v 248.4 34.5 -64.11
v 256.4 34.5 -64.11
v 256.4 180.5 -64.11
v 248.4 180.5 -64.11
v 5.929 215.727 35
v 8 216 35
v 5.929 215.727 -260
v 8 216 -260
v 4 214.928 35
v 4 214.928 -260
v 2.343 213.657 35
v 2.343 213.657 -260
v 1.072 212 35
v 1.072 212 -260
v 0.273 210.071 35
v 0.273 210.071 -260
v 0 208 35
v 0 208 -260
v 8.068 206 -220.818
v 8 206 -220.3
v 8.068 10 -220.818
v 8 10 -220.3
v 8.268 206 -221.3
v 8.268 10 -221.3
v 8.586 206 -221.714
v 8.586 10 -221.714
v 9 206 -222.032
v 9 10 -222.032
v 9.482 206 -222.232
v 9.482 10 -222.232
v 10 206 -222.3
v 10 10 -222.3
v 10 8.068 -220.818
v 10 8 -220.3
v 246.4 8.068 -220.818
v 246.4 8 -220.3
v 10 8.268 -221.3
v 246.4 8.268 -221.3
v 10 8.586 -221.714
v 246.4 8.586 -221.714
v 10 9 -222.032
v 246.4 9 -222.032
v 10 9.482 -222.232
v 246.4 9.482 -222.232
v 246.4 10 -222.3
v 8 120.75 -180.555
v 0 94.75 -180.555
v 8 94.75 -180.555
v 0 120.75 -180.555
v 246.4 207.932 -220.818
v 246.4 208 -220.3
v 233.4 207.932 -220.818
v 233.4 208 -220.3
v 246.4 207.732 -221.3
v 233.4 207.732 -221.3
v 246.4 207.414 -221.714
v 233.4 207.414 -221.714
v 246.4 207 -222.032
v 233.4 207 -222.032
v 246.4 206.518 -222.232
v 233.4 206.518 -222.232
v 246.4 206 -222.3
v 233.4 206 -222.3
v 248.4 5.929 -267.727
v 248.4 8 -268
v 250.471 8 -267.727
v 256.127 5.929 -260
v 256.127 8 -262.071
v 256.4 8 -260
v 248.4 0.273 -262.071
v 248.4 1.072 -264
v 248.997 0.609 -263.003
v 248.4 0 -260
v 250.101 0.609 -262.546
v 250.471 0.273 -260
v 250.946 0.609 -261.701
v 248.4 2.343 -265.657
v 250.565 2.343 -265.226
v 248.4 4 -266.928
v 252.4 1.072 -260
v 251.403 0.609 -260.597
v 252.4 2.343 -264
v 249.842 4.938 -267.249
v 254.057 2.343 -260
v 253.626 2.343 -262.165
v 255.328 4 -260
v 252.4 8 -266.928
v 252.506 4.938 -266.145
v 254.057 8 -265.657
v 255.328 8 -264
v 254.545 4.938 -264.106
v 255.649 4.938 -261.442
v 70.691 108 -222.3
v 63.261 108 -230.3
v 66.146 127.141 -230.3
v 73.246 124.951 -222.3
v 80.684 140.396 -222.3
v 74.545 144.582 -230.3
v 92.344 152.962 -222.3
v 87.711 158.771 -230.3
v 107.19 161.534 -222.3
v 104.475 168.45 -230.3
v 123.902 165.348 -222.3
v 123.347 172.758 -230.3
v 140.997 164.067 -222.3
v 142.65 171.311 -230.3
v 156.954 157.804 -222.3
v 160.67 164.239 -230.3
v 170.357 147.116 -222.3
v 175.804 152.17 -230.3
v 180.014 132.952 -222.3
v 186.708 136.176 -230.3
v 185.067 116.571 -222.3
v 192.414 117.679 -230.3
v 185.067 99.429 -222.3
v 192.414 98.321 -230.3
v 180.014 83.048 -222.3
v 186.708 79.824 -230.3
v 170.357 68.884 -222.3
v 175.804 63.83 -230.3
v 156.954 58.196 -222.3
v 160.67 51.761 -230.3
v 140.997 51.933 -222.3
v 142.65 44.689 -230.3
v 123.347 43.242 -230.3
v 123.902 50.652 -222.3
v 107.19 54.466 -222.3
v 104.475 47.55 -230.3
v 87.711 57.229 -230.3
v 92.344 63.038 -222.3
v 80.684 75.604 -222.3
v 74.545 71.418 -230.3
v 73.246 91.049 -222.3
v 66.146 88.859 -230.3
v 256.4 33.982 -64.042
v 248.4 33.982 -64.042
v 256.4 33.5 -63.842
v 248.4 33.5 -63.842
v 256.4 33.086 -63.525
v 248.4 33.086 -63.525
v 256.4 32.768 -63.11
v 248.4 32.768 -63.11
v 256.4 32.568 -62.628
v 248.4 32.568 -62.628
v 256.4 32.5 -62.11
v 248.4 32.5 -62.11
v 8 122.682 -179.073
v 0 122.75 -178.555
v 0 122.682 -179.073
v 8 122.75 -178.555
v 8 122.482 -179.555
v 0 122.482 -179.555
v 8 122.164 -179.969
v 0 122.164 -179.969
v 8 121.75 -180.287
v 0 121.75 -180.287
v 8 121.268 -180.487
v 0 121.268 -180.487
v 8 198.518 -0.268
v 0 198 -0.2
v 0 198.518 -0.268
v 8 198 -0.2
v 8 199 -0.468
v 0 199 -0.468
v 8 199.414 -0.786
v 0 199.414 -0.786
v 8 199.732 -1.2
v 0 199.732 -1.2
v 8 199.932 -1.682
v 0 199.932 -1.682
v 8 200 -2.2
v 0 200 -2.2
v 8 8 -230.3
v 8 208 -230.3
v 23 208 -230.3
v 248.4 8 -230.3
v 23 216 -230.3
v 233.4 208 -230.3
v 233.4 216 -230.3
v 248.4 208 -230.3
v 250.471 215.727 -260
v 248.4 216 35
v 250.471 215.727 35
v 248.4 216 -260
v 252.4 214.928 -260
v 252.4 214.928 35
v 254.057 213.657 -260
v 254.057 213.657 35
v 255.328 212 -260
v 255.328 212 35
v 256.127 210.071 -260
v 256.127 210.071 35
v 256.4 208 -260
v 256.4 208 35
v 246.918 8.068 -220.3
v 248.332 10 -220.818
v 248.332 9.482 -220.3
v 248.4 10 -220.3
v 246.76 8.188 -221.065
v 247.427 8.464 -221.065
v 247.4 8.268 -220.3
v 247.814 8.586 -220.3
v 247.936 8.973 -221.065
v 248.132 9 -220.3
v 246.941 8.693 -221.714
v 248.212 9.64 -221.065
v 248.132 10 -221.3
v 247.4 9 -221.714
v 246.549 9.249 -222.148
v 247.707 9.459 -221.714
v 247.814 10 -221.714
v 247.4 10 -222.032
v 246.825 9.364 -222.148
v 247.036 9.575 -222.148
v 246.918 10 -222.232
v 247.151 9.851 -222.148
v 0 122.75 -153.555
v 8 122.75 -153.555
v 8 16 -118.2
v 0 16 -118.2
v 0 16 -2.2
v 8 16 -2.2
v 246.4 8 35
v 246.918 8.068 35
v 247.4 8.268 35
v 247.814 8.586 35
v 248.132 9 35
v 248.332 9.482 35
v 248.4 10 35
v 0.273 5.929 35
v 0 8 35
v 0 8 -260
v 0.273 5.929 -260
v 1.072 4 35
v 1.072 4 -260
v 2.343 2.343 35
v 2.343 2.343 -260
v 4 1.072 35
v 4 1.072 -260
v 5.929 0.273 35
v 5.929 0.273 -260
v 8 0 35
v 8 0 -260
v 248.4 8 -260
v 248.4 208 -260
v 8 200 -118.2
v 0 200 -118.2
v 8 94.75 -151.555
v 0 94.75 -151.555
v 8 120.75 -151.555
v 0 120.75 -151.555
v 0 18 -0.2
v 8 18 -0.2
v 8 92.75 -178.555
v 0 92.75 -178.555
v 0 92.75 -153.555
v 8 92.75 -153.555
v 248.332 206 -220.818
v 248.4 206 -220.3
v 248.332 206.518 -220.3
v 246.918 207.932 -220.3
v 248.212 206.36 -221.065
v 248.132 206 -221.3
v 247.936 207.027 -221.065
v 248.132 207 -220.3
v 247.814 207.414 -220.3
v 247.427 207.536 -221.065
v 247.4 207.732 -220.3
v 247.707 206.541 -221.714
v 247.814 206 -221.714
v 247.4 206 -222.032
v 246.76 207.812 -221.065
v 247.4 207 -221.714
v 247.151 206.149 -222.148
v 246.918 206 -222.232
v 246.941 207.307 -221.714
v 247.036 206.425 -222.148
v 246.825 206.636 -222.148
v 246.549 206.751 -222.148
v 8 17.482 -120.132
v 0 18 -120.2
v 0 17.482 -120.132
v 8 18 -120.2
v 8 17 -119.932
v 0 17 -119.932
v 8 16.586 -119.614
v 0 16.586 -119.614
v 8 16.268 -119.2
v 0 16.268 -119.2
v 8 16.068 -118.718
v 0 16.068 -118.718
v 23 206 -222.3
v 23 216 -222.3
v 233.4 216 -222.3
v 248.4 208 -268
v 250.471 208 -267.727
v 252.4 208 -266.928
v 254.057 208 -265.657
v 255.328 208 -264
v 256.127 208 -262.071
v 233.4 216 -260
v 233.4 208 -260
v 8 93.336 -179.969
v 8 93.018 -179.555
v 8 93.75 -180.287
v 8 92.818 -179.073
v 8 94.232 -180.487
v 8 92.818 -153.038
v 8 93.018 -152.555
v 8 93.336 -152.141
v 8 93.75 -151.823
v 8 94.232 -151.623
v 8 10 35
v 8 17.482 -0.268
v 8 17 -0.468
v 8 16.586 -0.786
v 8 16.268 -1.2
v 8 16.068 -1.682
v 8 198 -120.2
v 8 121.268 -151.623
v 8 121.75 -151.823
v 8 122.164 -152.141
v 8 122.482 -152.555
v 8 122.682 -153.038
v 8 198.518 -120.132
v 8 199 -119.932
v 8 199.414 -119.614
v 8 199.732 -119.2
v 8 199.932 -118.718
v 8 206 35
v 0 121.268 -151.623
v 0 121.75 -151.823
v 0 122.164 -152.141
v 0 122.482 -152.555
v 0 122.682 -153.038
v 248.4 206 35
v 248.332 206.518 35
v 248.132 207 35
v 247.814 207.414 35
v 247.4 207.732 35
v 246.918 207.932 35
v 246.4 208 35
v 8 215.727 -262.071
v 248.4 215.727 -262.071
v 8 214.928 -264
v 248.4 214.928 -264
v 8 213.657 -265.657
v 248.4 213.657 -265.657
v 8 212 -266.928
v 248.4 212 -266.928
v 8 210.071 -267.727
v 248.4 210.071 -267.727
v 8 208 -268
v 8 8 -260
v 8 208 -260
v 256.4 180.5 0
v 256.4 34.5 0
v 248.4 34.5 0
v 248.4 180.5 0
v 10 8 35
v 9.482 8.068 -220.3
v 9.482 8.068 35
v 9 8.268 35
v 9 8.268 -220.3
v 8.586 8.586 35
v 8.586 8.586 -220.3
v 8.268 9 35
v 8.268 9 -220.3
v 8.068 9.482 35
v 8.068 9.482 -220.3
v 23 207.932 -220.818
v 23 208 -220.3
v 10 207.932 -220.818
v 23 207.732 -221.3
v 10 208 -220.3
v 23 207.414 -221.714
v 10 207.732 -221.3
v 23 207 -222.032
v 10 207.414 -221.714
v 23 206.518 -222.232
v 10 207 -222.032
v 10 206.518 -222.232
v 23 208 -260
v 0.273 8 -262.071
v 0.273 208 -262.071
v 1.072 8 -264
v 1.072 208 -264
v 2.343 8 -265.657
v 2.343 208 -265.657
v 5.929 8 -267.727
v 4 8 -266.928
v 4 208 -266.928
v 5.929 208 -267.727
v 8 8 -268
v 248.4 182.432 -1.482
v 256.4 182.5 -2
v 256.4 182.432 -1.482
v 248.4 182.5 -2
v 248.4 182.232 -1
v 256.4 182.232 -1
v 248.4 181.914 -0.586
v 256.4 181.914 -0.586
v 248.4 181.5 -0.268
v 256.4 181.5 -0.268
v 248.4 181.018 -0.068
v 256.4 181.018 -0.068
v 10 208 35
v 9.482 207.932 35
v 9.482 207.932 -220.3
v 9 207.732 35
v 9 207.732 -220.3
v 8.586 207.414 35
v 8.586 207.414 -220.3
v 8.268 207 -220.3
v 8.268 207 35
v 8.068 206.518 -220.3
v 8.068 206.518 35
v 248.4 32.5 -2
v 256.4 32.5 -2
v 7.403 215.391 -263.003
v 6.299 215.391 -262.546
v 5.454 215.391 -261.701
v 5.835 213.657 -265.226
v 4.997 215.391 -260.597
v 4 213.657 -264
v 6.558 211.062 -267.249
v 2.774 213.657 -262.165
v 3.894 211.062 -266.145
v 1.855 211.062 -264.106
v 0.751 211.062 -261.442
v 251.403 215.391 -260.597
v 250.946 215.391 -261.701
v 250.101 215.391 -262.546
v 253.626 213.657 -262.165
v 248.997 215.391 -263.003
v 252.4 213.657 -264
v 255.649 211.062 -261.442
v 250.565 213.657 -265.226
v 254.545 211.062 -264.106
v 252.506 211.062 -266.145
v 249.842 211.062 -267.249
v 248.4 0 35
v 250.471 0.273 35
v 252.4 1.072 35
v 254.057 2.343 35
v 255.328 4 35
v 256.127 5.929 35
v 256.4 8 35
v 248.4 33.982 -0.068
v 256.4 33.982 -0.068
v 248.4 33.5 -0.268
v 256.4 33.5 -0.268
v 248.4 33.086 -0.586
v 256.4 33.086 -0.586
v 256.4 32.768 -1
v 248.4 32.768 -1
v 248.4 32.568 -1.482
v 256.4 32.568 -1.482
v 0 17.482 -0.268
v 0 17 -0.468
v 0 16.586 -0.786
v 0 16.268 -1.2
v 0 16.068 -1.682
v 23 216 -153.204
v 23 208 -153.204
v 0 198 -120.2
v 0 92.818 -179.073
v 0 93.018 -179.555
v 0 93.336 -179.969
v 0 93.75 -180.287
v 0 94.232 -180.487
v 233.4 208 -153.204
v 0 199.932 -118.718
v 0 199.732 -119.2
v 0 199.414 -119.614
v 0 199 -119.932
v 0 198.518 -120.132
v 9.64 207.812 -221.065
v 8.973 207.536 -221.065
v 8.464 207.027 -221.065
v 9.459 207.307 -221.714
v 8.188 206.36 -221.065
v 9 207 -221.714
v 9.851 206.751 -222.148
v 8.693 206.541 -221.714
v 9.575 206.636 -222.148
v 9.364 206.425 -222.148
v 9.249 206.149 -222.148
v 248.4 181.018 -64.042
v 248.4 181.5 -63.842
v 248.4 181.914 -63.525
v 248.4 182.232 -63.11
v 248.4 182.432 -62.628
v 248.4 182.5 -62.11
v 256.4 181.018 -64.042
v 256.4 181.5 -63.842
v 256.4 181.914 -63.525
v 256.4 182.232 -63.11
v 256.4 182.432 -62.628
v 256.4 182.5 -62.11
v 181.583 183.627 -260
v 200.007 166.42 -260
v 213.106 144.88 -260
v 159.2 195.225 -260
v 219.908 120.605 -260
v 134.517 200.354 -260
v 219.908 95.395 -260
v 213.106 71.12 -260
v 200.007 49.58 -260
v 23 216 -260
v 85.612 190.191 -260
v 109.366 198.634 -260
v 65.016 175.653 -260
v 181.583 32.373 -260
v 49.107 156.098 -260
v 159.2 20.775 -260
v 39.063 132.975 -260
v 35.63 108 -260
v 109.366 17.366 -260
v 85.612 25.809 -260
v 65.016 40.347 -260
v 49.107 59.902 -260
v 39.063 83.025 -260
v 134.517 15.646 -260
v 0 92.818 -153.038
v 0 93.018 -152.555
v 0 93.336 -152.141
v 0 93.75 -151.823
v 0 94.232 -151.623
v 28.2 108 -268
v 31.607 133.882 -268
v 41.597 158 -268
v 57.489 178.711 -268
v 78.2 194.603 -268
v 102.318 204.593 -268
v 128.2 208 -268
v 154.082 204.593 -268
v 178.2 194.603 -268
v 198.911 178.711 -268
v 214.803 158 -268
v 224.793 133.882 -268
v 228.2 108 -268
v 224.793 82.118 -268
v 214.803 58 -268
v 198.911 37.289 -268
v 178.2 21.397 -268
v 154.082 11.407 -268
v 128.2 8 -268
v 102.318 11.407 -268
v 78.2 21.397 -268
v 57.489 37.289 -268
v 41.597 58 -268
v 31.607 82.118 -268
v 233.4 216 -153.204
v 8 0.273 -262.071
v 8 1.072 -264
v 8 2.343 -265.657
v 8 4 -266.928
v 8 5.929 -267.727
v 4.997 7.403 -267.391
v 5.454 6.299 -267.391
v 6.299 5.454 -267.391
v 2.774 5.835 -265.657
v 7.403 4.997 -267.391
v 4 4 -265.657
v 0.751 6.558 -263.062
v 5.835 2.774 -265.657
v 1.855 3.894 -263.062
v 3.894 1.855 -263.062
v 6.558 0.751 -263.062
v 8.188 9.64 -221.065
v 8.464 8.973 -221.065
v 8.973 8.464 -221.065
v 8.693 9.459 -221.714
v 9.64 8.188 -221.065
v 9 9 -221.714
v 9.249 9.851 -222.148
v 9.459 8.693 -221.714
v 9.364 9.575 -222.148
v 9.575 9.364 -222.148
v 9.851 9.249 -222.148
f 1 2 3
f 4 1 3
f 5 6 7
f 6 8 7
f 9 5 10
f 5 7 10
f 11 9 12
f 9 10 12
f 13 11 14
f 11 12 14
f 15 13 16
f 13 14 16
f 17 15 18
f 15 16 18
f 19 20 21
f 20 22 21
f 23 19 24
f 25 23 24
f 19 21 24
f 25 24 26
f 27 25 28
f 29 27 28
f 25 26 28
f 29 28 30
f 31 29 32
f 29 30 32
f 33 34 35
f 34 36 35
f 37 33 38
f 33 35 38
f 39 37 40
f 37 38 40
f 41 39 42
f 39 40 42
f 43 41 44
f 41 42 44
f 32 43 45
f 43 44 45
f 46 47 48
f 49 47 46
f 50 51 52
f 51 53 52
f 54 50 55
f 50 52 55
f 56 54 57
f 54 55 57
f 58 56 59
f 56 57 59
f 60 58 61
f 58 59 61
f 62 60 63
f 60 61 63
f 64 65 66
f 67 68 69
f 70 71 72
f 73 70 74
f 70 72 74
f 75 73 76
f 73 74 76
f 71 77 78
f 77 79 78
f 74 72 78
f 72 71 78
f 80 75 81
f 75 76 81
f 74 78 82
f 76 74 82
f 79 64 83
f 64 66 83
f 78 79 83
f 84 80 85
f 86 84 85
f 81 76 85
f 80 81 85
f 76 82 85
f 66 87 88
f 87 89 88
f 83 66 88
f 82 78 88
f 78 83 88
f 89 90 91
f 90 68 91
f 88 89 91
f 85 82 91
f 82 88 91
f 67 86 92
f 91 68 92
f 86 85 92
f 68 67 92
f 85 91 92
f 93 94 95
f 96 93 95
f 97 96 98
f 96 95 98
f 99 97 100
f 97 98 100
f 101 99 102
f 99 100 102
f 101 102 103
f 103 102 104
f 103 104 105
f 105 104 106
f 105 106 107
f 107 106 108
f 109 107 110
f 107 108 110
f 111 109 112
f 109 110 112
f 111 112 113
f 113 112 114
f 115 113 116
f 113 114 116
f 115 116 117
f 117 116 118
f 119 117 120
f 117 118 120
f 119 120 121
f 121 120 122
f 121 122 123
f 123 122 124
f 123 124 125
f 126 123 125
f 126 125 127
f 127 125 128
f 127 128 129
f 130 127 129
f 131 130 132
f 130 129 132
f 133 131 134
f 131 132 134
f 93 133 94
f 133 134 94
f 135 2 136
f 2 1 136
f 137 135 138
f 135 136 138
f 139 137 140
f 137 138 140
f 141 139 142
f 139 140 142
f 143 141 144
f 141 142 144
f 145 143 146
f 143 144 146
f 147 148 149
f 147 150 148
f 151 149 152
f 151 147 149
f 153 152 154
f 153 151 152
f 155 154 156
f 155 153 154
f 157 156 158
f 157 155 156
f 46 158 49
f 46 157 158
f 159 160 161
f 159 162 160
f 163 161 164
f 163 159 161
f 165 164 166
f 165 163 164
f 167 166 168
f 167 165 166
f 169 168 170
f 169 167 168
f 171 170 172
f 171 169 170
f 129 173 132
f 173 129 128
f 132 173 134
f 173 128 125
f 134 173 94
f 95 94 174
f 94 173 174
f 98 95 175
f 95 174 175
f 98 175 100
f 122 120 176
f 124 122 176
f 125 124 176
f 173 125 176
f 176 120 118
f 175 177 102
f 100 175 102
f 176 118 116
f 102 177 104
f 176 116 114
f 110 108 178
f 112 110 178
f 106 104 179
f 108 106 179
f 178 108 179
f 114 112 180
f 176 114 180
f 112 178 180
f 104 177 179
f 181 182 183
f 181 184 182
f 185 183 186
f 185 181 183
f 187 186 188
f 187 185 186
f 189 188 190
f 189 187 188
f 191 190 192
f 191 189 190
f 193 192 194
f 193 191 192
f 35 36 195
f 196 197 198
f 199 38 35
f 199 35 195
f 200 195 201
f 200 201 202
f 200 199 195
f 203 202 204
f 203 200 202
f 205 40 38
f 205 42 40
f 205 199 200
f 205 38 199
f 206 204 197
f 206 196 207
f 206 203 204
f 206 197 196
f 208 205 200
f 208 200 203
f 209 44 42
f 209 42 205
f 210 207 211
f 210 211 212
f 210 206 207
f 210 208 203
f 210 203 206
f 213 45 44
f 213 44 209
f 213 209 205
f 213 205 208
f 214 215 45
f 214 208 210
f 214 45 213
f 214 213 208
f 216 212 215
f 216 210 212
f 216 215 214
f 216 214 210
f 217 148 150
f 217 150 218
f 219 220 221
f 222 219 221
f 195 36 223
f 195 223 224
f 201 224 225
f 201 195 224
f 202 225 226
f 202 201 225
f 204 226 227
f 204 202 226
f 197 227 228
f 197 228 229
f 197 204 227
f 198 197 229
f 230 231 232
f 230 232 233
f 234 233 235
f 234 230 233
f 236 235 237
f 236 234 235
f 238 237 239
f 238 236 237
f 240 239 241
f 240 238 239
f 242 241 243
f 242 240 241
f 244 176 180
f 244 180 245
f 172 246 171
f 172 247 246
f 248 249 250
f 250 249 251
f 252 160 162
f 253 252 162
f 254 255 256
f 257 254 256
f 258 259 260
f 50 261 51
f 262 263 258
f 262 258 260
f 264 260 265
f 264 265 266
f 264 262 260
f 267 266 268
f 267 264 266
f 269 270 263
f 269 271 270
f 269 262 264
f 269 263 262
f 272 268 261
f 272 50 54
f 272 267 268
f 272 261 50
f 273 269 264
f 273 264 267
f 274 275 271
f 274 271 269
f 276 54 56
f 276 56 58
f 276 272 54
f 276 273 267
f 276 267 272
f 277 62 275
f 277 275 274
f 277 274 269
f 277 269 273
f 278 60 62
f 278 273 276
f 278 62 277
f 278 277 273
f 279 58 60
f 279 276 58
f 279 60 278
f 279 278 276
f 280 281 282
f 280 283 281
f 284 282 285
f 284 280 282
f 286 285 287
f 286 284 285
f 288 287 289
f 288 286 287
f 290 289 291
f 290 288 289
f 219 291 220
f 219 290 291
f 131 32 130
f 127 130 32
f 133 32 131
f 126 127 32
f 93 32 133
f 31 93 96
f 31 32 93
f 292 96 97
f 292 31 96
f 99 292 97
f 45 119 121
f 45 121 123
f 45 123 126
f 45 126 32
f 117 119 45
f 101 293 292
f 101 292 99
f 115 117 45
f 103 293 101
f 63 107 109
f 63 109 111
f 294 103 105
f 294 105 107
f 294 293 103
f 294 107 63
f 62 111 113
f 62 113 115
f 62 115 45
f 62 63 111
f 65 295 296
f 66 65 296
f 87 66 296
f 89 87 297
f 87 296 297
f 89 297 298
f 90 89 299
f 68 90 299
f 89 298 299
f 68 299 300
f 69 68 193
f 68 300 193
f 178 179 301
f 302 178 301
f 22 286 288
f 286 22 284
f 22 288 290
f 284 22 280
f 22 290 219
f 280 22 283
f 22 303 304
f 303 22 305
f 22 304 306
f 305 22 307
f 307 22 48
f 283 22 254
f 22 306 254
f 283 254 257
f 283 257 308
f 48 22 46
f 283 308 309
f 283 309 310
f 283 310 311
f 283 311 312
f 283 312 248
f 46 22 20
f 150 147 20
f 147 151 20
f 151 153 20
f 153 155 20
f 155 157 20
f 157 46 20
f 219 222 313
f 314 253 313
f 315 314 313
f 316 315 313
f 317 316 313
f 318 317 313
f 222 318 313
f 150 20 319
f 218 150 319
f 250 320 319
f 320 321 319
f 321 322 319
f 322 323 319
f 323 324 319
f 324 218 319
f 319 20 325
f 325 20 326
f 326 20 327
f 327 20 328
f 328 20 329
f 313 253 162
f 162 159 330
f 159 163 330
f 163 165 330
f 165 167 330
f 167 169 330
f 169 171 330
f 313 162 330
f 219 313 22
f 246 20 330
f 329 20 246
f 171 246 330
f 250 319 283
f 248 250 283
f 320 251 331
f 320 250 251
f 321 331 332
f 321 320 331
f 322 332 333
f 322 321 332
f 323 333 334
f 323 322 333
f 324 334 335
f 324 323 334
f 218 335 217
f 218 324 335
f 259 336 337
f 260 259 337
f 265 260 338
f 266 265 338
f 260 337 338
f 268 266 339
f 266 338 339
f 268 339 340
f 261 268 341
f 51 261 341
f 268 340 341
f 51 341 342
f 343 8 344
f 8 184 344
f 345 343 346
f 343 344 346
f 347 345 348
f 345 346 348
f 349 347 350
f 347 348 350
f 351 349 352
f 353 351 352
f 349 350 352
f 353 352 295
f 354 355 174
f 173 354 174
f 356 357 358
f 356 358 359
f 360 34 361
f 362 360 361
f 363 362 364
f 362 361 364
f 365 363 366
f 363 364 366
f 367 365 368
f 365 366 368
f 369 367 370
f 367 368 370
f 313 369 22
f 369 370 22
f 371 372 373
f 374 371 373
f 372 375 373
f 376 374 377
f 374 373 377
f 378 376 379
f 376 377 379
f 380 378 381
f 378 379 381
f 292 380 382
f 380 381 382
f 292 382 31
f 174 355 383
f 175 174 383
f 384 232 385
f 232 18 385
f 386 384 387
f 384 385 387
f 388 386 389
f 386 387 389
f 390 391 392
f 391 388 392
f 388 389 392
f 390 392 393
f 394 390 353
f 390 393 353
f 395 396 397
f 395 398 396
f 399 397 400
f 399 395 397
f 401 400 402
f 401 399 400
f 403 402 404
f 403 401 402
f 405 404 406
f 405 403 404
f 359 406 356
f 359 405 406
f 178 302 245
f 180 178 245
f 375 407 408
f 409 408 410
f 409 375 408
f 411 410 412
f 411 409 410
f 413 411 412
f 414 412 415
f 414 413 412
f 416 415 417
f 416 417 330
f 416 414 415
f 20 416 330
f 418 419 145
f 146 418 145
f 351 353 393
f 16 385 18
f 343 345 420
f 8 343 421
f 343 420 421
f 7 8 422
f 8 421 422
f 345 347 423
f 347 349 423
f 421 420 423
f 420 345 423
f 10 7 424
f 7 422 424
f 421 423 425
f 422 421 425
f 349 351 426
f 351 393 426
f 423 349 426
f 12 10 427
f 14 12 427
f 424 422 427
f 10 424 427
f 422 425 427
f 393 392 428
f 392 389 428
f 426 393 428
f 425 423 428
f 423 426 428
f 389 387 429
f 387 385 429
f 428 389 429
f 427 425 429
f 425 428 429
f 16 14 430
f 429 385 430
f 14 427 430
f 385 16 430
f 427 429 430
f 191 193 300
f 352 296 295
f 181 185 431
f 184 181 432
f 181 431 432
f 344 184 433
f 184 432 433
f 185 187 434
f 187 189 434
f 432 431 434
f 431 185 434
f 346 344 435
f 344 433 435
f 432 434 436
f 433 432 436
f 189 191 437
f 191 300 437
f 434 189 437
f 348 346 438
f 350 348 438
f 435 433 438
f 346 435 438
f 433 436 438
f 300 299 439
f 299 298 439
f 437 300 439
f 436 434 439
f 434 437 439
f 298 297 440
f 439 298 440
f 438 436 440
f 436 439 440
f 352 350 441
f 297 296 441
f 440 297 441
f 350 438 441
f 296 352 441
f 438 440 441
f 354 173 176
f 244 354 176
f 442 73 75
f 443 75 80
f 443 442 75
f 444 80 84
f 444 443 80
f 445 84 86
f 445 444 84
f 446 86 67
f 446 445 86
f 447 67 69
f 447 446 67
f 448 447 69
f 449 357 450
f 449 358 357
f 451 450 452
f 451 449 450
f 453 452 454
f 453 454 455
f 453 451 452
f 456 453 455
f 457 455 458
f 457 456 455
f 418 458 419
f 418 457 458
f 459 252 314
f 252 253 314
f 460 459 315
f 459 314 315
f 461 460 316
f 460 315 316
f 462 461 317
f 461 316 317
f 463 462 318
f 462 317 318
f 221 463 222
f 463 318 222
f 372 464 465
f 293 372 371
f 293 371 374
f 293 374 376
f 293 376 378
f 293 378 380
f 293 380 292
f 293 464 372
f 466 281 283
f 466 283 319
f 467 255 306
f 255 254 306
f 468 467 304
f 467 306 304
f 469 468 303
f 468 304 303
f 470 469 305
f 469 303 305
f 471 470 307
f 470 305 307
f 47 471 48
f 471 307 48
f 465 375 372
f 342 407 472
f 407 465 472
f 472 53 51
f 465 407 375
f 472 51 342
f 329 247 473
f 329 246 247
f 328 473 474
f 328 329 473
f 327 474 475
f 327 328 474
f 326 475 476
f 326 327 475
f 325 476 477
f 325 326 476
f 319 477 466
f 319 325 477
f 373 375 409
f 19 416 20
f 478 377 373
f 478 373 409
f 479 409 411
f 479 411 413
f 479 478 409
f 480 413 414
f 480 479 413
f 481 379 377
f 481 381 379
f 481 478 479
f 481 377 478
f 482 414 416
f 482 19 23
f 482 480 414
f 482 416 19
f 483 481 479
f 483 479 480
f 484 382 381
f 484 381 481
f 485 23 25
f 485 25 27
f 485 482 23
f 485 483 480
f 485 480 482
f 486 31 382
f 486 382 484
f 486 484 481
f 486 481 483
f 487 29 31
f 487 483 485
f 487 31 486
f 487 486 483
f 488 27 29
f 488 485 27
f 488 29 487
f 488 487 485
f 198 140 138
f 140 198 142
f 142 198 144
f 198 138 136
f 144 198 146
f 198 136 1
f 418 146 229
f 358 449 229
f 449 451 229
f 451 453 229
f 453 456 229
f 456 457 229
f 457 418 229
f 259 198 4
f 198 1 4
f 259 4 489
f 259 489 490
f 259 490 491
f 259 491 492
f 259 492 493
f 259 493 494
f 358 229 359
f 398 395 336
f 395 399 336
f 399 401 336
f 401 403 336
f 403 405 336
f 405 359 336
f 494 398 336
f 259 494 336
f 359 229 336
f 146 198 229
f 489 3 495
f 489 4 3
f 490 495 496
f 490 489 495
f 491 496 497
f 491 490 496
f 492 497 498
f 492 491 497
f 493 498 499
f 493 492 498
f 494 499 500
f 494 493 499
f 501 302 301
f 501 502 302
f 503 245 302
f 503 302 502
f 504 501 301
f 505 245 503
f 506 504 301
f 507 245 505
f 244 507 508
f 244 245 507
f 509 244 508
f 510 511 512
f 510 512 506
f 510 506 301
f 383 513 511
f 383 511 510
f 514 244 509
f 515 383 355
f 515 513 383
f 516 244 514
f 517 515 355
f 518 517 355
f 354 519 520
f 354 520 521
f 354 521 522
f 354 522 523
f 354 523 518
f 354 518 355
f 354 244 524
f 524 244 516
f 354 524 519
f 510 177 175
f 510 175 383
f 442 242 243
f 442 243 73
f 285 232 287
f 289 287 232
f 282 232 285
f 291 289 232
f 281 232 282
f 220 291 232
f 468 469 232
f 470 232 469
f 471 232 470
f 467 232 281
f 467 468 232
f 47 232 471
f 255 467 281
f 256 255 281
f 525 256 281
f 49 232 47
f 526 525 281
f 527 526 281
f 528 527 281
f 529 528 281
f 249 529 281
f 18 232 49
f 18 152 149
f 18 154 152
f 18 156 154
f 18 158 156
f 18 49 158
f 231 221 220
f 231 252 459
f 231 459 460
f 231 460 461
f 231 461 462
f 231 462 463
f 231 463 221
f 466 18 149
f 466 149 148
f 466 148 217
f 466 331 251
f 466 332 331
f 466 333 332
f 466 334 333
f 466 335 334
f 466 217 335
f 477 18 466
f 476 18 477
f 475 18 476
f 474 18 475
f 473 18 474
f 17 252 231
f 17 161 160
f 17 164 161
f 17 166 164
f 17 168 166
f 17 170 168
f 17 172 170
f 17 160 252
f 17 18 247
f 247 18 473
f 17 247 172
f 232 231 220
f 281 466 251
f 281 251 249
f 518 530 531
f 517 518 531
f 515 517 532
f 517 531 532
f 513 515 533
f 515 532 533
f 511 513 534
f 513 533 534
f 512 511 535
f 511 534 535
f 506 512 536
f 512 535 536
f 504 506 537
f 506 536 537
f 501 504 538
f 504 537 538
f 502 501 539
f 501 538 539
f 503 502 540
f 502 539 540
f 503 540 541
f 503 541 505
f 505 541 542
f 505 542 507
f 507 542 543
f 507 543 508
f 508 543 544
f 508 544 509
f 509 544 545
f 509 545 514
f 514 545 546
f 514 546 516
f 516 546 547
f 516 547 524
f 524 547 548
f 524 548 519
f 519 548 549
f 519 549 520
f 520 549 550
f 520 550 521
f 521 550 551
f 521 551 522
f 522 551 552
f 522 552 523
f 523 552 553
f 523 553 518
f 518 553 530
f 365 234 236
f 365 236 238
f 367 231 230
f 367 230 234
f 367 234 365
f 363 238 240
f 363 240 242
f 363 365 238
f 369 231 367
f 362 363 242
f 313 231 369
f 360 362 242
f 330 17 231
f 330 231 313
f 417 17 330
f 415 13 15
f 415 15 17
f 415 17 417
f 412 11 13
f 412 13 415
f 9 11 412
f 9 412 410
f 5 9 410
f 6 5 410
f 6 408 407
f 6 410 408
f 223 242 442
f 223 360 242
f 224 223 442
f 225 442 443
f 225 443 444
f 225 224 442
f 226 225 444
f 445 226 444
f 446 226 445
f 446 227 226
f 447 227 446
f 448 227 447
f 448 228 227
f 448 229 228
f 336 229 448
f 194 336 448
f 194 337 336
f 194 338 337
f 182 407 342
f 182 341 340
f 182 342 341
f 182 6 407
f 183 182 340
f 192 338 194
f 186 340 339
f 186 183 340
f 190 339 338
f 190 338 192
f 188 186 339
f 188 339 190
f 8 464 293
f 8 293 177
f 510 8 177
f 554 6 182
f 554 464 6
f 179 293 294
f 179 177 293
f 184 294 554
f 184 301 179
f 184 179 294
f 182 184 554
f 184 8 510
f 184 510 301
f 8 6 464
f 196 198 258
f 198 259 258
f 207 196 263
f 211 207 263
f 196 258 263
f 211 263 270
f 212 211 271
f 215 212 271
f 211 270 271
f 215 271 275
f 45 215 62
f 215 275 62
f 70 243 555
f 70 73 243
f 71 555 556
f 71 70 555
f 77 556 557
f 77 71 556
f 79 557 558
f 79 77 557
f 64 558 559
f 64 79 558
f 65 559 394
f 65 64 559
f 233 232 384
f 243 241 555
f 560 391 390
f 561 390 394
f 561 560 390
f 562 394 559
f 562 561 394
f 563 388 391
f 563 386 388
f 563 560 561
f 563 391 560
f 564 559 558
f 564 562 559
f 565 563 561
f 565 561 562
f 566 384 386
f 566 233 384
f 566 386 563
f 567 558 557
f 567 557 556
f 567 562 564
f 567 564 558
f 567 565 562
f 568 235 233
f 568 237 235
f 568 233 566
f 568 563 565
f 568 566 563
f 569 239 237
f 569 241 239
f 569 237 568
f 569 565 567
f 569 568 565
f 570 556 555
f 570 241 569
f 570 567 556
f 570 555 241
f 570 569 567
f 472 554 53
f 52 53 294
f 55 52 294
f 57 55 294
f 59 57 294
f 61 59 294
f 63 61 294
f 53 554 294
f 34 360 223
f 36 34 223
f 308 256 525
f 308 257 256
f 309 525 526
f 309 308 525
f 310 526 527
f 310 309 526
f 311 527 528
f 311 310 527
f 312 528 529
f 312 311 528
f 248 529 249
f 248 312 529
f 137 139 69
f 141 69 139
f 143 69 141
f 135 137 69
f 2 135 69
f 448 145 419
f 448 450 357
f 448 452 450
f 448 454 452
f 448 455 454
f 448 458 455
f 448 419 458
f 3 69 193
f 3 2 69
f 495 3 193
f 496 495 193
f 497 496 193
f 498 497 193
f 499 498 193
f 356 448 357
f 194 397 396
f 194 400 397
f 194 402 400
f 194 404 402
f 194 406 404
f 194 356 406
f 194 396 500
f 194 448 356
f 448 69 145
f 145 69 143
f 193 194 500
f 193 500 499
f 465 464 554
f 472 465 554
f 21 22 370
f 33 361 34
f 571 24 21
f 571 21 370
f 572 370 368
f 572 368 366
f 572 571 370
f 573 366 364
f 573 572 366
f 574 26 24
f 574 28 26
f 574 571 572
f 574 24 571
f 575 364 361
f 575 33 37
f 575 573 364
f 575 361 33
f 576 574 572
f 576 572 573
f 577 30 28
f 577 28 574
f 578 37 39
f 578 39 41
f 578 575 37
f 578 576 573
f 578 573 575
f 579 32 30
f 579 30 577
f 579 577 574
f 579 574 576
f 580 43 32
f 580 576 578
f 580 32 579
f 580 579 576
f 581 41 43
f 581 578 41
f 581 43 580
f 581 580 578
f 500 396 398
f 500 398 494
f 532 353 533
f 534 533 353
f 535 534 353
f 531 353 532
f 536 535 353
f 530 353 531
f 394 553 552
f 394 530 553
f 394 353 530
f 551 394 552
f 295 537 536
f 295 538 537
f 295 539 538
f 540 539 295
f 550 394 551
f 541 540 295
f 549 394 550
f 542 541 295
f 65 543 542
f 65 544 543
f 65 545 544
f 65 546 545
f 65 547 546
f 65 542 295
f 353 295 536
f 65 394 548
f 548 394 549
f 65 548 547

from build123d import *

# Parameters (mm, degrees)
BOSS_EXTRUDE1_DEPTH = 216
SKETCH3_W           = 240.4
SKETCH3_H           = 260
BOSS_EXTRUDE2_DEPTH = 8
SKETCH4_R           = 100
CUT_EXTRUDE1_DEPTH  = 8
CUT_EXTRUDE1_DRAFT  = -42.88487357
SKETCH6_W           = 240.4
SKETCH6_H           = 208
BOSS_EXTRUDE3_DEPTH = 8
SKETCH7_R           = 64.93911957
CUT_EXTRUDE2_DEPTH  = 8
CUT_EXTRUDE2_DRAFT  = -42.88487357
SKETCH8_W           = 70.3
SKETCH8_H           = 200
CUT_EXTRUDE3_DEPTH  = 8
SKETCH9_W           = 256.4
SKETCH9_H           = 216
SKETCH9_W_2         = 240.4
SKETCH9_H_2         = 200
BOSS_EXTRUDE4_DEPTH = 35.2
SKETCH12_W          = 240.4
SKETCH12_H          = 153.003510621
BOSS_EXTRUDE6_DEPTH = 8
SKETCH13_W          = 64.11038507
SKETCH13_H          = 150
CUT_EXTRUDE6_DEPTH  = 8
SKETCH15_W          = 49.9
SKETCH15_H          = 184
CUT_EXTRUDE8_DEPTH  = 8
SKETCH16_W          = 70.2
SKETCH16_H          = 8
SKETCH16_W_2        = 70.1
BOSS_EXTRUDE7_DEPTH = 8
SKETCH19_W          = 15
SKETCH19_H          = 106.796489379
BOSS_EXTRUDE8_DEPTH = 8
FILLET2_R           = 8
FILLET3_R           = 2
FILLET4_R           = 2
FILLET5_R           = 2
SKETCH20_W          = 29
SKETCH20_H          = 30
CUT_EXTRUDE9_DEPTH  = 10
FILLET6_R           = 2


with BuildPart() as part:
    # Sketch2 → Boss-Extrude1 (new body)
    with BuildSketch(Plane(origin=(0, 0, 0), x_dir=(1, 0, 0), z_dir=(0, 1, 0))):
        Polygon((256.4, 0), (248.4, 0), (248.4, 260), (8, 260), (8, 0), (0, 0), (0, 268), (256.4, 268), align=None)
    extrude(amount=BOSS_EXTRUDE1_DEPTH)

    # Sketch3 → Boss-Extrude2 (add)
    with BuildSketch(Plane.XZ):
        with Locations((128.2, -130)):
            Rectangle(SKETCH3_W, SKETCH3_H)
    extrude(amount=-BOSS_EXTRUDE2_DEPTH)


with BuildPart() as cut_extrude1_tool:
    # Sketch4 → Cut-Extrude1 (with draft: the straight prism first)
    with BuildSketch(Plane(origin=(0, 0, -268), x_dir=(-1, 0, 0), z_dir=(0, 0, -1))):
        with Locations((-128.2, 108)):
            Circle(SKETCH4_R)
    extrude(amount=-CUT_EXTRUDE1_DEPTH)
    # Cut-Extrude1: the draft: its side faces are tilted about the plane it starts from
    cut_extrude1_sides = [cut_extrude1_tool.faces().sort_by_distance(p)[0] for p in [
        (228.2, 108, -264),
    ]]
    draft(cut_extrude1_sides, Plane(origin=(0, 0, -268), x_dir=(-1, 0, 0), z_dir=(0, 0, -1)), CUT_EXTRUDE1_DRAFT)


with BuildPart() as part_1:
    add(part.part)

    # Cut-Extrude1: cut by cut_extrude1_tool
    add(cut_extrude1_tool.part, mode=Mode.SUBTRACT)

    # Sketch6 → Boss-Extrude3 (add)
    with BuildSketch(Plane.XY.offset(-230.3)):
        with Locations((128.2, 112)):
            Rectangle(SKETCH6_W, SKETCH6_H)
    extrude(amount=BOSS_EXTRUDE3_DEPTH)


with BuildPart() as cut_extrude2_tool:
    # Sketch7 → Cut-Extrude2 (with draft: the straight prism first)
    with BuildSketch(Plane(origin=(0, 0, -230.3), x_dir=(-1, 0, 0), z_dir=(0, 0, -1))):
        with Locations((-128.2, 108)):
            Circle(SKETCH7_R)
    extrude(amount=-CUT_EXTRUDE2_DEPTH)
    # Cut-Extrude2: the draft: its side faces are tilted about the plane it starts from
    cut_extrude2_sides = [cut_extrude2_tool.faces().sort_by_distance(p)[0] for p in [
        (193.13911957, 108, -226.3),
    ]]
    draft(cut_extrude2_sides, Plane(origin=(0, 0, -230.3), x_dir=(-1, 0, 0), z_dir=(0, 0, -1)), CUT_EXTRUDE2_DRAFT)


with BuildPart() as part_2:
    add(part_1.part)

    # Cut-Extrude2: cut by cut_extrude2_tool
    add(cut_extrude2_tool.part, mode=Mode.SUBTRACT)

    # Sketch8 → Cut-Extrude3 (cut)
    with BuildSketch(Plane.ZY):
        with Locations((-35.15, 108)):
            Rectangle(SKETCH8_W, SKETCH8_H)
    extrude(amount=-CUT_EXTRUDE3_DEPTH, mode=Mode.SUBTRACT)

    # Sketch9 → Boss-Extrude4 (add)
    with BuildSketch(Plane.XY.offset(35)):
        with Locations((128.2, 108)):
            Rectangle(SKETCH9_W, SKETCH9_H)
        with Locations((128.2, 108)):
            Rectangle(SKETCH9_W_2, SKETCH9_H_2, mode=Mode.SUBTRACT)
    extrude(amount=-BOSS_EXTRUDE4_DEPTH)

    # Sketch12 → Boss-Extrude6 (add)
    with BuildSketch(Plane(origin=(0, 216, 0), x_dir=(1, 0, 0), z_dir=(0, 1, 0))):
        with Locations((128.2, 76.701755311)):
            Rectangle(SKETCH12_W, SKETCH12_H)
    extrude(amount=-BOSS_EXTRUDE6_DEPTH)

    # Sketch13 → Cut-Extrude6 (cut)
    with BuildSketch(Plane(origin=(256.4, 0, 0), x_dir=(0, 0, -1), z_dir=(1, 0, 0))):
        with Locations((32.055192535, 107.5)):
            Rectangle(SKETCH13_W, SKETCH13_H)
    extrude(amount=-CUT_EXTRUDE6_DEPTH, mode=Mode.SUBTRACT)

    # Sketch15 → Cut-Extrude8 (cut)
    with BuildSketch(Plane.ZY):
        with Locations((-95.25, 108)):
            Rectangle(SKETCH15_W, SKETCH15_H)
    extrude(amount=-CUT_EXTRUDE8_DEPTH, mode=Mode.SUBTRACT)

    # Sketch16 → Boss-Extrude7 (add)
    with BuildSketch(Plane.ZY):
        with Locations((-35.2, 12)):
            Rectangle(SKETCH16_W, SKETCH16_H)
        with Locations((-35.25, 204)):
            Rectangle(SKETCH16_W_2, SKETCH16_H)
    extrude(amount=-BOSS_EXTRUDE7_DEPTH)

    # Sketch19 → Boss-Extrude8 (add)
    with BuildSketch(Plane(origin=(0, 216, 0), x_dir=(1, 0, 0), z_dir=(0, 1, 0))):
        with Locations((15.5, 206.601755311)):
            Rectangle(SKETCH19_W, SKETCH19_H)
        with Locations((240.9, 206.601755311)):
            Rectangle(SKETCH19_W, SKETCH19_H)
    extrude(amount=-BOSS_EXTRUDE8_DEPTH)

    # Fillet2
    fillet2_edges = [part_2.edges().sort_by_distance(p)[0] for p in [
        (0, 0, -116.5),
        (0, 108, -268),
        (256.4, 108, -268),
        (256.4, 216, -116.5),
        (128.2, 216, -268),
        (0, 216, -116.5),
        (128.2, 0, -268),
        (256.4, 0, -116.5),
    ]]
    fillet(fillet2_edges, radius=FILLET2_R - 0.0001)  # a hair under: the kernel refuses the full size

    # Fillet3
    fillet3_edges = [part_2.edges().sort_by_distance(p)[0] for p in [
        (8, 208, -93.65),
        (248.4, 208, -93.65),
        (248.4, 8, -93.65),
        (8, 8, -93.65),
    ]]
    fillet(fillet3_edges, radius=FILLET3_R)

    # Fillet4
    fillet4_edges = [part_2.edges().sort_by_distance(p)[0] for p in [
        (16.5, 208, -222.3),
        (239.9, 208, -222.3),
        (248.4, 108, -222.3),
        (128.2, 8, -222.3),
        (8, 108, -222.3),
        (8.585786438, 207.414213562, -222.3),
        (247.814213562, 207.414213562, -222.3),
        (8.585786438, 8.585786438, -222.3),
        (247.814213562, 8.585786438, -222.3),
    ]]
    fillet(fillet4_edges, radius=FILLET4_R)

    # Fillet5
    fillet5_edges = [part_2.edges().sort_by_distance(p)[0] for p in [
        (252.4, 32.5, 0),
        (252.4, 182.5, 0),
        (252.4, 182.5, -64.11038507),
        (252.4, 32.5, -64.11038507),
        (4, 16, -120.2),
        (4, 200, -120.2),
        (4, 16, -0.2),
        (4, 200, -0.2),
    ]]
    fillet(fillet5_edges, radius=FILLET5_R)

    # Sketch20 → Cut-Extrude9 (cut)
    with BuildSketch(Plane.ZY):
        with Locations((-166.055192535, 107.75)):
            Rectangle(SKETCH20_W, SKETCH20_H)
    extrude(amount=-CUT_EXTRUDE9_DEPTH, mode=Mode.SUBTRACT)

    # Fillet6
    fillet6_edges = [part_2.edges().sort_by_distance(p)[0] for p in [
        (4, 122.75, -151.555192535),
        (4, 92.75, -151.555192535),
        (4, 92.75, -180.555192535),
        (4, 122.75, -180.555192535),
    ]]
    fillet(fillet6_edges, radius=FILLET6_R)


solid = part_2.part
